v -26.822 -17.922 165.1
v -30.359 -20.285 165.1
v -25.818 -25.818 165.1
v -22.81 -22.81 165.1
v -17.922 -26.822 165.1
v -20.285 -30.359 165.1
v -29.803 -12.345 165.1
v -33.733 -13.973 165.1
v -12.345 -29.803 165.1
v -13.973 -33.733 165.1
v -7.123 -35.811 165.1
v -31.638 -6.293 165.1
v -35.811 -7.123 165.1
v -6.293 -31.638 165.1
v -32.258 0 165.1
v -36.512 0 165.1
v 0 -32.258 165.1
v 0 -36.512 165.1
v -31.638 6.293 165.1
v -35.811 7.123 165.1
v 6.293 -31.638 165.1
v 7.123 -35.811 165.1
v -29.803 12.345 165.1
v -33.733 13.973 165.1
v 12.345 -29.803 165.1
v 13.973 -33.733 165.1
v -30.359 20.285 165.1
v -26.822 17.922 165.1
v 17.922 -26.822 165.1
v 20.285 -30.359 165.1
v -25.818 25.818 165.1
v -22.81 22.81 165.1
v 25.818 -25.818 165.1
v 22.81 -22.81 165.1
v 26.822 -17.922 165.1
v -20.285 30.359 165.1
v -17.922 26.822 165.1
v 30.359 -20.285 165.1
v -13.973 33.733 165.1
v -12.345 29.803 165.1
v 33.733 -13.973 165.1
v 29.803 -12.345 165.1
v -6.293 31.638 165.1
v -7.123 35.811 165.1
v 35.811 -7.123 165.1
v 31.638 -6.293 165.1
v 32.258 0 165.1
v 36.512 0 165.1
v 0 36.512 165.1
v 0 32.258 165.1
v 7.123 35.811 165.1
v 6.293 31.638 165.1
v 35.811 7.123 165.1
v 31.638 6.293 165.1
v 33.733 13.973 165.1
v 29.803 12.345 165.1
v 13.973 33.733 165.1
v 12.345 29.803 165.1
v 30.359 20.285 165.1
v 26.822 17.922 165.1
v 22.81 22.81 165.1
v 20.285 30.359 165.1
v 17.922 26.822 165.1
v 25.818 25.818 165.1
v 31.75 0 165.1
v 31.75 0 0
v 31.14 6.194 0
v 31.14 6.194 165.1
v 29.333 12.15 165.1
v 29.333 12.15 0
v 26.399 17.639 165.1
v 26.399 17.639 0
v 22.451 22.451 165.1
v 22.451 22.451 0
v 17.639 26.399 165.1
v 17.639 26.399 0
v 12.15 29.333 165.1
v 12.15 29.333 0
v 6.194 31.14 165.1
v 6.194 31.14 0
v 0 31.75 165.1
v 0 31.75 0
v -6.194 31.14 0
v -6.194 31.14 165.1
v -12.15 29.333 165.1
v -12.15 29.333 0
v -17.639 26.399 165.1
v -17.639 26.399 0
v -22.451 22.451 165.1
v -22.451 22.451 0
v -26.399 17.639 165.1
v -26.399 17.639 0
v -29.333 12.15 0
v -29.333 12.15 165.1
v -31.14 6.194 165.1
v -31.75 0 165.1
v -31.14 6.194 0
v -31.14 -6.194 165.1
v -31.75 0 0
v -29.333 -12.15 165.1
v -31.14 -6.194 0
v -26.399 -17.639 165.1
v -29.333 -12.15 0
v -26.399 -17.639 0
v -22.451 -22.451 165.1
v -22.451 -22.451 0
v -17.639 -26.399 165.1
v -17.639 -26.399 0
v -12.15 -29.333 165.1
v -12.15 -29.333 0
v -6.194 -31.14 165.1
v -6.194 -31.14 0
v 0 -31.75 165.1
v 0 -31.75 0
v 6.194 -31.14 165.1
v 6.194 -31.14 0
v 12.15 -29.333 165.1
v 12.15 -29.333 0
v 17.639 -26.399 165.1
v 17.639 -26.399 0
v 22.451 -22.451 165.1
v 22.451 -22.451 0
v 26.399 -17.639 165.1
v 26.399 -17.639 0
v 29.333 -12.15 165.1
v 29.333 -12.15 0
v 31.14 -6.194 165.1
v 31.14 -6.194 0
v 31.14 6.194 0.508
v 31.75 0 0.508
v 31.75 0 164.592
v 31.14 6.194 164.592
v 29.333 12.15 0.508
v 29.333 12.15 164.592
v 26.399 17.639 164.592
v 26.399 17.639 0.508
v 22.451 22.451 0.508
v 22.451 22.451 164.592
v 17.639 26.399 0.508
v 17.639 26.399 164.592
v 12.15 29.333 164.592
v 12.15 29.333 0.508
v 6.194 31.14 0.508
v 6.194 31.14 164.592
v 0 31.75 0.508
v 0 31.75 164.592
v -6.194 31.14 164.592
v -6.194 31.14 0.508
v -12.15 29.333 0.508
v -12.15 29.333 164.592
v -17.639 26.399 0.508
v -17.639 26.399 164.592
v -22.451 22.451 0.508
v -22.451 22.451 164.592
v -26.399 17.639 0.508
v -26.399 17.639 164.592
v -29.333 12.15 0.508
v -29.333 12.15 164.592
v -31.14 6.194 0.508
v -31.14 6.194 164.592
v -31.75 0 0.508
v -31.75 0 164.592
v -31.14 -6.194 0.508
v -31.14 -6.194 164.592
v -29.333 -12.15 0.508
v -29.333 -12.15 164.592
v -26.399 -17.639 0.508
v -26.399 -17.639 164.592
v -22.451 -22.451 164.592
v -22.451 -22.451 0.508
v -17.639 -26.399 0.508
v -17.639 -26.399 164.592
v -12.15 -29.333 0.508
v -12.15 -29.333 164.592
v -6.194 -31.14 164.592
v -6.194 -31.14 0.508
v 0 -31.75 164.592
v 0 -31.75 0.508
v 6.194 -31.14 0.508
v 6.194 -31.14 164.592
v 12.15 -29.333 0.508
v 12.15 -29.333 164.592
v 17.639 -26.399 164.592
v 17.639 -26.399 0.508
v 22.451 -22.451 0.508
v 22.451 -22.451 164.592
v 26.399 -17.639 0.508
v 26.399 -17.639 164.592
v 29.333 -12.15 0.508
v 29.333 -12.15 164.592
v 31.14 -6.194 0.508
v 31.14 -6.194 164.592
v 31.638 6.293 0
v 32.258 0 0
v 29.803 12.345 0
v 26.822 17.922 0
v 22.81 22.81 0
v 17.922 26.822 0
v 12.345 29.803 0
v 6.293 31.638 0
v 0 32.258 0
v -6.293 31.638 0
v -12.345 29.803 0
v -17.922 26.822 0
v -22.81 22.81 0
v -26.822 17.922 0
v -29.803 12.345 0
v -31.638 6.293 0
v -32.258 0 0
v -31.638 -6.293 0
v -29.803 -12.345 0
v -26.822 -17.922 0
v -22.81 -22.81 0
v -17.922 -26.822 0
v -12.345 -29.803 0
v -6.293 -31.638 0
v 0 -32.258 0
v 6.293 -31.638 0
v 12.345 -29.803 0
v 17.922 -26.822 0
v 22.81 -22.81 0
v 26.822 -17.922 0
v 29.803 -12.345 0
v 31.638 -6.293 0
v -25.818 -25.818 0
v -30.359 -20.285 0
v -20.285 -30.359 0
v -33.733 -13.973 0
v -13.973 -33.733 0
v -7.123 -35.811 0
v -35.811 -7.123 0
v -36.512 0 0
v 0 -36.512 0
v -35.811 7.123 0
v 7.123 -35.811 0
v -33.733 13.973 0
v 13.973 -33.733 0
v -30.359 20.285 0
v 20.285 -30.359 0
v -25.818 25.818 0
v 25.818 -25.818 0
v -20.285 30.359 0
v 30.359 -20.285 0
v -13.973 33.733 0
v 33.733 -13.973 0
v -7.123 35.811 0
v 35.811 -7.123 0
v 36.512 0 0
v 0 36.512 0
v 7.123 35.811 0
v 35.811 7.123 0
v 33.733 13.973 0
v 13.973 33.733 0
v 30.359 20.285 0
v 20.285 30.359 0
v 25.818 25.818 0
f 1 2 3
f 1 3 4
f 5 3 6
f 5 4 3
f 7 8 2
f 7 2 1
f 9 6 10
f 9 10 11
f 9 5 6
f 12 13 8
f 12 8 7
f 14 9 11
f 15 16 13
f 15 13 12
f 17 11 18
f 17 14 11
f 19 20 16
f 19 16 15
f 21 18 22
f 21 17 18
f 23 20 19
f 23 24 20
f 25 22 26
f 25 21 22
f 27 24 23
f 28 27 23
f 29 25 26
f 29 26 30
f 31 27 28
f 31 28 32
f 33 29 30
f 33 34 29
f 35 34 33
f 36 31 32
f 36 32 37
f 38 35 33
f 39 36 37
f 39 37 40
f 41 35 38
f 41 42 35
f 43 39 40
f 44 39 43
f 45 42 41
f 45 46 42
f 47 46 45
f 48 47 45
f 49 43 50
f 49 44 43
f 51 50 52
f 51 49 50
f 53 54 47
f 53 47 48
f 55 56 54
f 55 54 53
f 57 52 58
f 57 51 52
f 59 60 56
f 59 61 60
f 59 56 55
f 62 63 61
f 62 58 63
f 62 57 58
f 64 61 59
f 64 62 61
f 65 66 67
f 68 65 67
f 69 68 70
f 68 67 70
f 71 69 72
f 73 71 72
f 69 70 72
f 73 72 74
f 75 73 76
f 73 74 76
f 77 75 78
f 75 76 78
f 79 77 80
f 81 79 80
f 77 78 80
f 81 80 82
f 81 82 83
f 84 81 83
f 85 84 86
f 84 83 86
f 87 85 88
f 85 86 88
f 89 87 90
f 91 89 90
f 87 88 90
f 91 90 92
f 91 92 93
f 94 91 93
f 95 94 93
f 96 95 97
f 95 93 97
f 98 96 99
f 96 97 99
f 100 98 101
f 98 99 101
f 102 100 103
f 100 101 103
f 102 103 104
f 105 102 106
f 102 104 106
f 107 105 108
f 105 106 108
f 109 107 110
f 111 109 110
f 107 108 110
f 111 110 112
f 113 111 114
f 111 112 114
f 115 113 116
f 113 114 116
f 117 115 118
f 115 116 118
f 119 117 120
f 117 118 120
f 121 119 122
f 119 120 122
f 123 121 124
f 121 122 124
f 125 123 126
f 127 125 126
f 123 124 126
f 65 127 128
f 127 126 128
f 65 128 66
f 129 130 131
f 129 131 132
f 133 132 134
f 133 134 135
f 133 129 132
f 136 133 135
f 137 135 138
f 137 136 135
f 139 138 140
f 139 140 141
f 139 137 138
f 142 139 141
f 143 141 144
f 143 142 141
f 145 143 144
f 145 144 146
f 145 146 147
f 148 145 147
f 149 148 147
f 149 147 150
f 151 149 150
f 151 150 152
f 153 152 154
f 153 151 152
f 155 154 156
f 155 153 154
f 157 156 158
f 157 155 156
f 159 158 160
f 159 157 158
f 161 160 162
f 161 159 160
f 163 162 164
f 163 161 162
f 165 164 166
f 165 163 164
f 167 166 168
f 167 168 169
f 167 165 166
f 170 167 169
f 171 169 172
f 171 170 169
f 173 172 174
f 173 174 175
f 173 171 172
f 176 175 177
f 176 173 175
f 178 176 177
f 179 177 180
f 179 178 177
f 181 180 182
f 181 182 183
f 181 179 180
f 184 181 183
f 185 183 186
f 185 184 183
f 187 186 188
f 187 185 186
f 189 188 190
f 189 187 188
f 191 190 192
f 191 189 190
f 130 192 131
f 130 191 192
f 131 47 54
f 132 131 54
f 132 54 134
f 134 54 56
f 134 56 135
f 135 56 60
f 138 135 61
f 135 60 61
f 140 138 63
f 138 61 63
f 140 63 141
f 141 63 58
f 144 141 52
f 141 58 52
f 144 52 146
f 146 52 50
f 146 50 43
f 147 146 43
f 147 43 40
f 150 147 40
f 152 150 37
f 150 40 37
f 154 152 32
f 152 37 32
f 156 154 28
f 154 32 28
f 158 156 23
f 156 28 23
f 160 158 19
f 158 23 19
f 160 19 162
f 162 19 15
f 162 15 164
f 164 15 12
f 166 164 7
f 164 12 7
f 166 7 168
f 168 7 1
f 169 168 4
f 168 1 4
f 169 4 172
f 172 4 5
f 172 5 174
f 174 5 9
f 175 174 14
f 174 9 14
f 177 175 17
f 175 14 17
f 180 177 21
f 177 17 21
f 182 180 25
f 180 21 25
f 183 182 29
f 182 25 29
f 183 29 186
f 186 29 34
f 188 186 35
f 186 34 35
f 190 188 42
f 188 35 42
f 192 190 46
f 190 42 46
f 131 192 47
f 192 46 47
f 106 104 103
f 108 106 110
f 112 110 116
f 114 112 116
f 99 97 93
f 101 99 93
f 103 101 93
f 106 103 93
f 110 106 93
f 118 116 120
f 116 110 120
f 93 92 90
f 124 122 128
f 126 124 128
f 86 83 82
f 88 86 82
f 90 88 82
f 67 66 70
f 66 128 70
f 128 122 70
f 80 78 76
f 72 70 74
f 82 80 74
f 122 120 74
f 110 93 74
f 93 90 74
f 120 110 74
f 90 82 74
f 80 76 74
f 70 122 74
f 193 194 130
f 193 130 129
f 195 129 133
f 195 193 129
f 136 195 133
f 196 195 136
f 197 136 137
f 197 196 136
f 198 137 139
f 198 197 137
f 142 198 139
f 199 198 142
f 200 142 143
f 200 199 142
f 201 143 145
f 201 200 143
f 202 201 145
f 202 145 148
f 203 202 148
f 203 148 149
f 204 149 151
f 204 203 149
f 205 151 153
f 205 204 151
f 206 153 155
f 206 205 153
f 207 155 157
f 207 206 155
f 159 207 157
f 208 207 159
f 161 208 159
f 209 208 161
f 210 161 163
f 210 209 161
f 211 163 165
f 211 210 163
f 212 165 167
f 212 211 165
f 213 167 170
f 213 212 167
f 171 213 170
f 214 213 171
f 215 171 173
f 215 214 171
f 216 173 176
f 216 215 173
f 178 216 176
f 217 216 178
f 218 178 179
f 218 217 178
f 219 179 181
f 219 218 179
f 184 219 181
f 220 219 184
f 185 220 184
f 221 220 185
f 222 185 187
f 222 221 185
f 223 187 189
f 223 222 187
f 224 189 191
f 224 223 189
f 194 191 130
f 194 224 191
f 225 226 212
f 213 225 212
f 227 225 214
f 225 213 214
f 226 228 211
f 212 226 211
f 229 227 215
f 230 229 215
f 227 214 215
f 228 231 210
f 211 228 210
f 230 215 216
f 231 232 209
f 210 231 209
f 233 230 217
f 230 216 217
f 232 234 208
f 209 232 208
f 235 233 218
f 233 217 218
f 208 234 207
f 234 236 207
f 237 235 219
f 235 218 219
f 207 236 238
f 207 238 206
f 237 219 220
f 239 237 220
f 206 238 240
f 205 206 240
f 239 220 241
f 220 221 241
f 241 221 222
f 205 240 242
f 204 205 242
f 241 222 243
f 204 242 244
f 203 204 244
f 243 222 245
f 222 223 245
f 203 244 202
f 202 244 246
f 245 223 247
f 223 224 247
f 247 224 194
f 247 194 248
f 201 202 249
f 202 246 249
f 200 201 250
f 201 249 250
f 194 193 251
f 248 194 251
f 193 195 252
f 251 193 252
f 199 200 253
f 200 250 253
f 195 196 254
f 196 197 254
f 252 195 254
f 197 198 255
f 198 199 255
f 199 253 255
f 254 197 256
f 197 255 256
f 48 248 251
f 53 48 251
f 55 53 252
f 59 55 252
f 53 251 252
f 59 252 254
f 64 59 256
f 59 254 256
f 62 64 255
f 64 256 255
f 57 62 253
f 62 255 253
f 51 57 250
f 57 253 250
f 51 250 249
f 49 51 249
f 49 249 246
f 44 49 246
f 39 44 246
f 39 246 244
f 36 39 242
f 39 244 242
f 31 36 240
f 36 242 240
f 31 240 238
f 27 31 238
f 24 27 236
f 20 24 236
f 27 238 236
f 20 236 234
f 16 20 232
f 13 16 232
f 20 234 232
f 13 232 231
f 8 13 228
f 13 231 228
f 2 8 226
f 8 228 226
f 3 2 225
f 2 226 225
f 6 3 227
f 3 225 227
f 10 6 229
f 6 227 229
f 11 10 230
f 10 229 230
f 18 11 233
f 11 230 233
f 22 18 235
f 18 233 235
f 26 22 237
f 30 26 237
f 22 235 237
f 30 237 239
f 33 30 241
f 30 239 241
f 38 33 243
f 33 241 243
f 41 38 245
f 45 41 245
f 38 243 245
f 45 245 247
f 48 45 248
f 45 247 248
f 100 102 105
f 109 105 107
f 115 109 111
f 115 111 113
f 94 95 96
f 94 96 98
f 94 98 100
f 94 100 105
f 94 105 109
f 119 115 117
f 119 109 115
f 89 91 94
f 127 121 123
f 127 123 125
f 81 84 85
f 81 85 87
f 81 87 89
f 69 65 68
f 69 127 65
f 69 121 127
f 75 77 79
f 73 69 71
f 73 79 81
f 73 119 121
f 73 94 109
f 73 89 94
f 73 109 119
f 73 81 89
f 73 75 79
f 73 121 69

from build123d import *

# Parameters (mm, degrees)
SKETCH1_R           = 36.5125
SKETCH1_R_2         = 31.75
EXTRUDE1_DEPTH      = 165.1
CHAMFER1_SIZE       = 0.508
SKETCH1_2_R         = 31.75
BOSS_EXTRUDE1_DEPTH = 165.1


with BuildPart() as part:
    # Sketch1 → Extrude1 (new body)
    with BuildSketch(Plane.XY):
        Circle(SKETCH1_R)
        Circle(SKETCH1_R_2, mode=Mode.SUBTRACT)
    extrude(amount=EXTRUDE1_DEPTH)

    # Chamfer1
    chamfer1_edges = [part.edges().sort_by_distance(p)[0] for p in [
        (-31.75, 0, 0),
        (-31.75, 0, 165.1),
    ]]
    chamfer(chamfer1_edges, length=CHAMFER1_SIZE)


with BuildPart() as body_2:
    # Sketch1<2> → Boss-Extrude1 (new body)
    with BuildSketch(Plane.XY):
        Circle(SKETCH1_2_R)
    extrude(amount=BOSS_EXTRUDE1_DEPTH)


solid = Compound([part.part, body_2.part])
